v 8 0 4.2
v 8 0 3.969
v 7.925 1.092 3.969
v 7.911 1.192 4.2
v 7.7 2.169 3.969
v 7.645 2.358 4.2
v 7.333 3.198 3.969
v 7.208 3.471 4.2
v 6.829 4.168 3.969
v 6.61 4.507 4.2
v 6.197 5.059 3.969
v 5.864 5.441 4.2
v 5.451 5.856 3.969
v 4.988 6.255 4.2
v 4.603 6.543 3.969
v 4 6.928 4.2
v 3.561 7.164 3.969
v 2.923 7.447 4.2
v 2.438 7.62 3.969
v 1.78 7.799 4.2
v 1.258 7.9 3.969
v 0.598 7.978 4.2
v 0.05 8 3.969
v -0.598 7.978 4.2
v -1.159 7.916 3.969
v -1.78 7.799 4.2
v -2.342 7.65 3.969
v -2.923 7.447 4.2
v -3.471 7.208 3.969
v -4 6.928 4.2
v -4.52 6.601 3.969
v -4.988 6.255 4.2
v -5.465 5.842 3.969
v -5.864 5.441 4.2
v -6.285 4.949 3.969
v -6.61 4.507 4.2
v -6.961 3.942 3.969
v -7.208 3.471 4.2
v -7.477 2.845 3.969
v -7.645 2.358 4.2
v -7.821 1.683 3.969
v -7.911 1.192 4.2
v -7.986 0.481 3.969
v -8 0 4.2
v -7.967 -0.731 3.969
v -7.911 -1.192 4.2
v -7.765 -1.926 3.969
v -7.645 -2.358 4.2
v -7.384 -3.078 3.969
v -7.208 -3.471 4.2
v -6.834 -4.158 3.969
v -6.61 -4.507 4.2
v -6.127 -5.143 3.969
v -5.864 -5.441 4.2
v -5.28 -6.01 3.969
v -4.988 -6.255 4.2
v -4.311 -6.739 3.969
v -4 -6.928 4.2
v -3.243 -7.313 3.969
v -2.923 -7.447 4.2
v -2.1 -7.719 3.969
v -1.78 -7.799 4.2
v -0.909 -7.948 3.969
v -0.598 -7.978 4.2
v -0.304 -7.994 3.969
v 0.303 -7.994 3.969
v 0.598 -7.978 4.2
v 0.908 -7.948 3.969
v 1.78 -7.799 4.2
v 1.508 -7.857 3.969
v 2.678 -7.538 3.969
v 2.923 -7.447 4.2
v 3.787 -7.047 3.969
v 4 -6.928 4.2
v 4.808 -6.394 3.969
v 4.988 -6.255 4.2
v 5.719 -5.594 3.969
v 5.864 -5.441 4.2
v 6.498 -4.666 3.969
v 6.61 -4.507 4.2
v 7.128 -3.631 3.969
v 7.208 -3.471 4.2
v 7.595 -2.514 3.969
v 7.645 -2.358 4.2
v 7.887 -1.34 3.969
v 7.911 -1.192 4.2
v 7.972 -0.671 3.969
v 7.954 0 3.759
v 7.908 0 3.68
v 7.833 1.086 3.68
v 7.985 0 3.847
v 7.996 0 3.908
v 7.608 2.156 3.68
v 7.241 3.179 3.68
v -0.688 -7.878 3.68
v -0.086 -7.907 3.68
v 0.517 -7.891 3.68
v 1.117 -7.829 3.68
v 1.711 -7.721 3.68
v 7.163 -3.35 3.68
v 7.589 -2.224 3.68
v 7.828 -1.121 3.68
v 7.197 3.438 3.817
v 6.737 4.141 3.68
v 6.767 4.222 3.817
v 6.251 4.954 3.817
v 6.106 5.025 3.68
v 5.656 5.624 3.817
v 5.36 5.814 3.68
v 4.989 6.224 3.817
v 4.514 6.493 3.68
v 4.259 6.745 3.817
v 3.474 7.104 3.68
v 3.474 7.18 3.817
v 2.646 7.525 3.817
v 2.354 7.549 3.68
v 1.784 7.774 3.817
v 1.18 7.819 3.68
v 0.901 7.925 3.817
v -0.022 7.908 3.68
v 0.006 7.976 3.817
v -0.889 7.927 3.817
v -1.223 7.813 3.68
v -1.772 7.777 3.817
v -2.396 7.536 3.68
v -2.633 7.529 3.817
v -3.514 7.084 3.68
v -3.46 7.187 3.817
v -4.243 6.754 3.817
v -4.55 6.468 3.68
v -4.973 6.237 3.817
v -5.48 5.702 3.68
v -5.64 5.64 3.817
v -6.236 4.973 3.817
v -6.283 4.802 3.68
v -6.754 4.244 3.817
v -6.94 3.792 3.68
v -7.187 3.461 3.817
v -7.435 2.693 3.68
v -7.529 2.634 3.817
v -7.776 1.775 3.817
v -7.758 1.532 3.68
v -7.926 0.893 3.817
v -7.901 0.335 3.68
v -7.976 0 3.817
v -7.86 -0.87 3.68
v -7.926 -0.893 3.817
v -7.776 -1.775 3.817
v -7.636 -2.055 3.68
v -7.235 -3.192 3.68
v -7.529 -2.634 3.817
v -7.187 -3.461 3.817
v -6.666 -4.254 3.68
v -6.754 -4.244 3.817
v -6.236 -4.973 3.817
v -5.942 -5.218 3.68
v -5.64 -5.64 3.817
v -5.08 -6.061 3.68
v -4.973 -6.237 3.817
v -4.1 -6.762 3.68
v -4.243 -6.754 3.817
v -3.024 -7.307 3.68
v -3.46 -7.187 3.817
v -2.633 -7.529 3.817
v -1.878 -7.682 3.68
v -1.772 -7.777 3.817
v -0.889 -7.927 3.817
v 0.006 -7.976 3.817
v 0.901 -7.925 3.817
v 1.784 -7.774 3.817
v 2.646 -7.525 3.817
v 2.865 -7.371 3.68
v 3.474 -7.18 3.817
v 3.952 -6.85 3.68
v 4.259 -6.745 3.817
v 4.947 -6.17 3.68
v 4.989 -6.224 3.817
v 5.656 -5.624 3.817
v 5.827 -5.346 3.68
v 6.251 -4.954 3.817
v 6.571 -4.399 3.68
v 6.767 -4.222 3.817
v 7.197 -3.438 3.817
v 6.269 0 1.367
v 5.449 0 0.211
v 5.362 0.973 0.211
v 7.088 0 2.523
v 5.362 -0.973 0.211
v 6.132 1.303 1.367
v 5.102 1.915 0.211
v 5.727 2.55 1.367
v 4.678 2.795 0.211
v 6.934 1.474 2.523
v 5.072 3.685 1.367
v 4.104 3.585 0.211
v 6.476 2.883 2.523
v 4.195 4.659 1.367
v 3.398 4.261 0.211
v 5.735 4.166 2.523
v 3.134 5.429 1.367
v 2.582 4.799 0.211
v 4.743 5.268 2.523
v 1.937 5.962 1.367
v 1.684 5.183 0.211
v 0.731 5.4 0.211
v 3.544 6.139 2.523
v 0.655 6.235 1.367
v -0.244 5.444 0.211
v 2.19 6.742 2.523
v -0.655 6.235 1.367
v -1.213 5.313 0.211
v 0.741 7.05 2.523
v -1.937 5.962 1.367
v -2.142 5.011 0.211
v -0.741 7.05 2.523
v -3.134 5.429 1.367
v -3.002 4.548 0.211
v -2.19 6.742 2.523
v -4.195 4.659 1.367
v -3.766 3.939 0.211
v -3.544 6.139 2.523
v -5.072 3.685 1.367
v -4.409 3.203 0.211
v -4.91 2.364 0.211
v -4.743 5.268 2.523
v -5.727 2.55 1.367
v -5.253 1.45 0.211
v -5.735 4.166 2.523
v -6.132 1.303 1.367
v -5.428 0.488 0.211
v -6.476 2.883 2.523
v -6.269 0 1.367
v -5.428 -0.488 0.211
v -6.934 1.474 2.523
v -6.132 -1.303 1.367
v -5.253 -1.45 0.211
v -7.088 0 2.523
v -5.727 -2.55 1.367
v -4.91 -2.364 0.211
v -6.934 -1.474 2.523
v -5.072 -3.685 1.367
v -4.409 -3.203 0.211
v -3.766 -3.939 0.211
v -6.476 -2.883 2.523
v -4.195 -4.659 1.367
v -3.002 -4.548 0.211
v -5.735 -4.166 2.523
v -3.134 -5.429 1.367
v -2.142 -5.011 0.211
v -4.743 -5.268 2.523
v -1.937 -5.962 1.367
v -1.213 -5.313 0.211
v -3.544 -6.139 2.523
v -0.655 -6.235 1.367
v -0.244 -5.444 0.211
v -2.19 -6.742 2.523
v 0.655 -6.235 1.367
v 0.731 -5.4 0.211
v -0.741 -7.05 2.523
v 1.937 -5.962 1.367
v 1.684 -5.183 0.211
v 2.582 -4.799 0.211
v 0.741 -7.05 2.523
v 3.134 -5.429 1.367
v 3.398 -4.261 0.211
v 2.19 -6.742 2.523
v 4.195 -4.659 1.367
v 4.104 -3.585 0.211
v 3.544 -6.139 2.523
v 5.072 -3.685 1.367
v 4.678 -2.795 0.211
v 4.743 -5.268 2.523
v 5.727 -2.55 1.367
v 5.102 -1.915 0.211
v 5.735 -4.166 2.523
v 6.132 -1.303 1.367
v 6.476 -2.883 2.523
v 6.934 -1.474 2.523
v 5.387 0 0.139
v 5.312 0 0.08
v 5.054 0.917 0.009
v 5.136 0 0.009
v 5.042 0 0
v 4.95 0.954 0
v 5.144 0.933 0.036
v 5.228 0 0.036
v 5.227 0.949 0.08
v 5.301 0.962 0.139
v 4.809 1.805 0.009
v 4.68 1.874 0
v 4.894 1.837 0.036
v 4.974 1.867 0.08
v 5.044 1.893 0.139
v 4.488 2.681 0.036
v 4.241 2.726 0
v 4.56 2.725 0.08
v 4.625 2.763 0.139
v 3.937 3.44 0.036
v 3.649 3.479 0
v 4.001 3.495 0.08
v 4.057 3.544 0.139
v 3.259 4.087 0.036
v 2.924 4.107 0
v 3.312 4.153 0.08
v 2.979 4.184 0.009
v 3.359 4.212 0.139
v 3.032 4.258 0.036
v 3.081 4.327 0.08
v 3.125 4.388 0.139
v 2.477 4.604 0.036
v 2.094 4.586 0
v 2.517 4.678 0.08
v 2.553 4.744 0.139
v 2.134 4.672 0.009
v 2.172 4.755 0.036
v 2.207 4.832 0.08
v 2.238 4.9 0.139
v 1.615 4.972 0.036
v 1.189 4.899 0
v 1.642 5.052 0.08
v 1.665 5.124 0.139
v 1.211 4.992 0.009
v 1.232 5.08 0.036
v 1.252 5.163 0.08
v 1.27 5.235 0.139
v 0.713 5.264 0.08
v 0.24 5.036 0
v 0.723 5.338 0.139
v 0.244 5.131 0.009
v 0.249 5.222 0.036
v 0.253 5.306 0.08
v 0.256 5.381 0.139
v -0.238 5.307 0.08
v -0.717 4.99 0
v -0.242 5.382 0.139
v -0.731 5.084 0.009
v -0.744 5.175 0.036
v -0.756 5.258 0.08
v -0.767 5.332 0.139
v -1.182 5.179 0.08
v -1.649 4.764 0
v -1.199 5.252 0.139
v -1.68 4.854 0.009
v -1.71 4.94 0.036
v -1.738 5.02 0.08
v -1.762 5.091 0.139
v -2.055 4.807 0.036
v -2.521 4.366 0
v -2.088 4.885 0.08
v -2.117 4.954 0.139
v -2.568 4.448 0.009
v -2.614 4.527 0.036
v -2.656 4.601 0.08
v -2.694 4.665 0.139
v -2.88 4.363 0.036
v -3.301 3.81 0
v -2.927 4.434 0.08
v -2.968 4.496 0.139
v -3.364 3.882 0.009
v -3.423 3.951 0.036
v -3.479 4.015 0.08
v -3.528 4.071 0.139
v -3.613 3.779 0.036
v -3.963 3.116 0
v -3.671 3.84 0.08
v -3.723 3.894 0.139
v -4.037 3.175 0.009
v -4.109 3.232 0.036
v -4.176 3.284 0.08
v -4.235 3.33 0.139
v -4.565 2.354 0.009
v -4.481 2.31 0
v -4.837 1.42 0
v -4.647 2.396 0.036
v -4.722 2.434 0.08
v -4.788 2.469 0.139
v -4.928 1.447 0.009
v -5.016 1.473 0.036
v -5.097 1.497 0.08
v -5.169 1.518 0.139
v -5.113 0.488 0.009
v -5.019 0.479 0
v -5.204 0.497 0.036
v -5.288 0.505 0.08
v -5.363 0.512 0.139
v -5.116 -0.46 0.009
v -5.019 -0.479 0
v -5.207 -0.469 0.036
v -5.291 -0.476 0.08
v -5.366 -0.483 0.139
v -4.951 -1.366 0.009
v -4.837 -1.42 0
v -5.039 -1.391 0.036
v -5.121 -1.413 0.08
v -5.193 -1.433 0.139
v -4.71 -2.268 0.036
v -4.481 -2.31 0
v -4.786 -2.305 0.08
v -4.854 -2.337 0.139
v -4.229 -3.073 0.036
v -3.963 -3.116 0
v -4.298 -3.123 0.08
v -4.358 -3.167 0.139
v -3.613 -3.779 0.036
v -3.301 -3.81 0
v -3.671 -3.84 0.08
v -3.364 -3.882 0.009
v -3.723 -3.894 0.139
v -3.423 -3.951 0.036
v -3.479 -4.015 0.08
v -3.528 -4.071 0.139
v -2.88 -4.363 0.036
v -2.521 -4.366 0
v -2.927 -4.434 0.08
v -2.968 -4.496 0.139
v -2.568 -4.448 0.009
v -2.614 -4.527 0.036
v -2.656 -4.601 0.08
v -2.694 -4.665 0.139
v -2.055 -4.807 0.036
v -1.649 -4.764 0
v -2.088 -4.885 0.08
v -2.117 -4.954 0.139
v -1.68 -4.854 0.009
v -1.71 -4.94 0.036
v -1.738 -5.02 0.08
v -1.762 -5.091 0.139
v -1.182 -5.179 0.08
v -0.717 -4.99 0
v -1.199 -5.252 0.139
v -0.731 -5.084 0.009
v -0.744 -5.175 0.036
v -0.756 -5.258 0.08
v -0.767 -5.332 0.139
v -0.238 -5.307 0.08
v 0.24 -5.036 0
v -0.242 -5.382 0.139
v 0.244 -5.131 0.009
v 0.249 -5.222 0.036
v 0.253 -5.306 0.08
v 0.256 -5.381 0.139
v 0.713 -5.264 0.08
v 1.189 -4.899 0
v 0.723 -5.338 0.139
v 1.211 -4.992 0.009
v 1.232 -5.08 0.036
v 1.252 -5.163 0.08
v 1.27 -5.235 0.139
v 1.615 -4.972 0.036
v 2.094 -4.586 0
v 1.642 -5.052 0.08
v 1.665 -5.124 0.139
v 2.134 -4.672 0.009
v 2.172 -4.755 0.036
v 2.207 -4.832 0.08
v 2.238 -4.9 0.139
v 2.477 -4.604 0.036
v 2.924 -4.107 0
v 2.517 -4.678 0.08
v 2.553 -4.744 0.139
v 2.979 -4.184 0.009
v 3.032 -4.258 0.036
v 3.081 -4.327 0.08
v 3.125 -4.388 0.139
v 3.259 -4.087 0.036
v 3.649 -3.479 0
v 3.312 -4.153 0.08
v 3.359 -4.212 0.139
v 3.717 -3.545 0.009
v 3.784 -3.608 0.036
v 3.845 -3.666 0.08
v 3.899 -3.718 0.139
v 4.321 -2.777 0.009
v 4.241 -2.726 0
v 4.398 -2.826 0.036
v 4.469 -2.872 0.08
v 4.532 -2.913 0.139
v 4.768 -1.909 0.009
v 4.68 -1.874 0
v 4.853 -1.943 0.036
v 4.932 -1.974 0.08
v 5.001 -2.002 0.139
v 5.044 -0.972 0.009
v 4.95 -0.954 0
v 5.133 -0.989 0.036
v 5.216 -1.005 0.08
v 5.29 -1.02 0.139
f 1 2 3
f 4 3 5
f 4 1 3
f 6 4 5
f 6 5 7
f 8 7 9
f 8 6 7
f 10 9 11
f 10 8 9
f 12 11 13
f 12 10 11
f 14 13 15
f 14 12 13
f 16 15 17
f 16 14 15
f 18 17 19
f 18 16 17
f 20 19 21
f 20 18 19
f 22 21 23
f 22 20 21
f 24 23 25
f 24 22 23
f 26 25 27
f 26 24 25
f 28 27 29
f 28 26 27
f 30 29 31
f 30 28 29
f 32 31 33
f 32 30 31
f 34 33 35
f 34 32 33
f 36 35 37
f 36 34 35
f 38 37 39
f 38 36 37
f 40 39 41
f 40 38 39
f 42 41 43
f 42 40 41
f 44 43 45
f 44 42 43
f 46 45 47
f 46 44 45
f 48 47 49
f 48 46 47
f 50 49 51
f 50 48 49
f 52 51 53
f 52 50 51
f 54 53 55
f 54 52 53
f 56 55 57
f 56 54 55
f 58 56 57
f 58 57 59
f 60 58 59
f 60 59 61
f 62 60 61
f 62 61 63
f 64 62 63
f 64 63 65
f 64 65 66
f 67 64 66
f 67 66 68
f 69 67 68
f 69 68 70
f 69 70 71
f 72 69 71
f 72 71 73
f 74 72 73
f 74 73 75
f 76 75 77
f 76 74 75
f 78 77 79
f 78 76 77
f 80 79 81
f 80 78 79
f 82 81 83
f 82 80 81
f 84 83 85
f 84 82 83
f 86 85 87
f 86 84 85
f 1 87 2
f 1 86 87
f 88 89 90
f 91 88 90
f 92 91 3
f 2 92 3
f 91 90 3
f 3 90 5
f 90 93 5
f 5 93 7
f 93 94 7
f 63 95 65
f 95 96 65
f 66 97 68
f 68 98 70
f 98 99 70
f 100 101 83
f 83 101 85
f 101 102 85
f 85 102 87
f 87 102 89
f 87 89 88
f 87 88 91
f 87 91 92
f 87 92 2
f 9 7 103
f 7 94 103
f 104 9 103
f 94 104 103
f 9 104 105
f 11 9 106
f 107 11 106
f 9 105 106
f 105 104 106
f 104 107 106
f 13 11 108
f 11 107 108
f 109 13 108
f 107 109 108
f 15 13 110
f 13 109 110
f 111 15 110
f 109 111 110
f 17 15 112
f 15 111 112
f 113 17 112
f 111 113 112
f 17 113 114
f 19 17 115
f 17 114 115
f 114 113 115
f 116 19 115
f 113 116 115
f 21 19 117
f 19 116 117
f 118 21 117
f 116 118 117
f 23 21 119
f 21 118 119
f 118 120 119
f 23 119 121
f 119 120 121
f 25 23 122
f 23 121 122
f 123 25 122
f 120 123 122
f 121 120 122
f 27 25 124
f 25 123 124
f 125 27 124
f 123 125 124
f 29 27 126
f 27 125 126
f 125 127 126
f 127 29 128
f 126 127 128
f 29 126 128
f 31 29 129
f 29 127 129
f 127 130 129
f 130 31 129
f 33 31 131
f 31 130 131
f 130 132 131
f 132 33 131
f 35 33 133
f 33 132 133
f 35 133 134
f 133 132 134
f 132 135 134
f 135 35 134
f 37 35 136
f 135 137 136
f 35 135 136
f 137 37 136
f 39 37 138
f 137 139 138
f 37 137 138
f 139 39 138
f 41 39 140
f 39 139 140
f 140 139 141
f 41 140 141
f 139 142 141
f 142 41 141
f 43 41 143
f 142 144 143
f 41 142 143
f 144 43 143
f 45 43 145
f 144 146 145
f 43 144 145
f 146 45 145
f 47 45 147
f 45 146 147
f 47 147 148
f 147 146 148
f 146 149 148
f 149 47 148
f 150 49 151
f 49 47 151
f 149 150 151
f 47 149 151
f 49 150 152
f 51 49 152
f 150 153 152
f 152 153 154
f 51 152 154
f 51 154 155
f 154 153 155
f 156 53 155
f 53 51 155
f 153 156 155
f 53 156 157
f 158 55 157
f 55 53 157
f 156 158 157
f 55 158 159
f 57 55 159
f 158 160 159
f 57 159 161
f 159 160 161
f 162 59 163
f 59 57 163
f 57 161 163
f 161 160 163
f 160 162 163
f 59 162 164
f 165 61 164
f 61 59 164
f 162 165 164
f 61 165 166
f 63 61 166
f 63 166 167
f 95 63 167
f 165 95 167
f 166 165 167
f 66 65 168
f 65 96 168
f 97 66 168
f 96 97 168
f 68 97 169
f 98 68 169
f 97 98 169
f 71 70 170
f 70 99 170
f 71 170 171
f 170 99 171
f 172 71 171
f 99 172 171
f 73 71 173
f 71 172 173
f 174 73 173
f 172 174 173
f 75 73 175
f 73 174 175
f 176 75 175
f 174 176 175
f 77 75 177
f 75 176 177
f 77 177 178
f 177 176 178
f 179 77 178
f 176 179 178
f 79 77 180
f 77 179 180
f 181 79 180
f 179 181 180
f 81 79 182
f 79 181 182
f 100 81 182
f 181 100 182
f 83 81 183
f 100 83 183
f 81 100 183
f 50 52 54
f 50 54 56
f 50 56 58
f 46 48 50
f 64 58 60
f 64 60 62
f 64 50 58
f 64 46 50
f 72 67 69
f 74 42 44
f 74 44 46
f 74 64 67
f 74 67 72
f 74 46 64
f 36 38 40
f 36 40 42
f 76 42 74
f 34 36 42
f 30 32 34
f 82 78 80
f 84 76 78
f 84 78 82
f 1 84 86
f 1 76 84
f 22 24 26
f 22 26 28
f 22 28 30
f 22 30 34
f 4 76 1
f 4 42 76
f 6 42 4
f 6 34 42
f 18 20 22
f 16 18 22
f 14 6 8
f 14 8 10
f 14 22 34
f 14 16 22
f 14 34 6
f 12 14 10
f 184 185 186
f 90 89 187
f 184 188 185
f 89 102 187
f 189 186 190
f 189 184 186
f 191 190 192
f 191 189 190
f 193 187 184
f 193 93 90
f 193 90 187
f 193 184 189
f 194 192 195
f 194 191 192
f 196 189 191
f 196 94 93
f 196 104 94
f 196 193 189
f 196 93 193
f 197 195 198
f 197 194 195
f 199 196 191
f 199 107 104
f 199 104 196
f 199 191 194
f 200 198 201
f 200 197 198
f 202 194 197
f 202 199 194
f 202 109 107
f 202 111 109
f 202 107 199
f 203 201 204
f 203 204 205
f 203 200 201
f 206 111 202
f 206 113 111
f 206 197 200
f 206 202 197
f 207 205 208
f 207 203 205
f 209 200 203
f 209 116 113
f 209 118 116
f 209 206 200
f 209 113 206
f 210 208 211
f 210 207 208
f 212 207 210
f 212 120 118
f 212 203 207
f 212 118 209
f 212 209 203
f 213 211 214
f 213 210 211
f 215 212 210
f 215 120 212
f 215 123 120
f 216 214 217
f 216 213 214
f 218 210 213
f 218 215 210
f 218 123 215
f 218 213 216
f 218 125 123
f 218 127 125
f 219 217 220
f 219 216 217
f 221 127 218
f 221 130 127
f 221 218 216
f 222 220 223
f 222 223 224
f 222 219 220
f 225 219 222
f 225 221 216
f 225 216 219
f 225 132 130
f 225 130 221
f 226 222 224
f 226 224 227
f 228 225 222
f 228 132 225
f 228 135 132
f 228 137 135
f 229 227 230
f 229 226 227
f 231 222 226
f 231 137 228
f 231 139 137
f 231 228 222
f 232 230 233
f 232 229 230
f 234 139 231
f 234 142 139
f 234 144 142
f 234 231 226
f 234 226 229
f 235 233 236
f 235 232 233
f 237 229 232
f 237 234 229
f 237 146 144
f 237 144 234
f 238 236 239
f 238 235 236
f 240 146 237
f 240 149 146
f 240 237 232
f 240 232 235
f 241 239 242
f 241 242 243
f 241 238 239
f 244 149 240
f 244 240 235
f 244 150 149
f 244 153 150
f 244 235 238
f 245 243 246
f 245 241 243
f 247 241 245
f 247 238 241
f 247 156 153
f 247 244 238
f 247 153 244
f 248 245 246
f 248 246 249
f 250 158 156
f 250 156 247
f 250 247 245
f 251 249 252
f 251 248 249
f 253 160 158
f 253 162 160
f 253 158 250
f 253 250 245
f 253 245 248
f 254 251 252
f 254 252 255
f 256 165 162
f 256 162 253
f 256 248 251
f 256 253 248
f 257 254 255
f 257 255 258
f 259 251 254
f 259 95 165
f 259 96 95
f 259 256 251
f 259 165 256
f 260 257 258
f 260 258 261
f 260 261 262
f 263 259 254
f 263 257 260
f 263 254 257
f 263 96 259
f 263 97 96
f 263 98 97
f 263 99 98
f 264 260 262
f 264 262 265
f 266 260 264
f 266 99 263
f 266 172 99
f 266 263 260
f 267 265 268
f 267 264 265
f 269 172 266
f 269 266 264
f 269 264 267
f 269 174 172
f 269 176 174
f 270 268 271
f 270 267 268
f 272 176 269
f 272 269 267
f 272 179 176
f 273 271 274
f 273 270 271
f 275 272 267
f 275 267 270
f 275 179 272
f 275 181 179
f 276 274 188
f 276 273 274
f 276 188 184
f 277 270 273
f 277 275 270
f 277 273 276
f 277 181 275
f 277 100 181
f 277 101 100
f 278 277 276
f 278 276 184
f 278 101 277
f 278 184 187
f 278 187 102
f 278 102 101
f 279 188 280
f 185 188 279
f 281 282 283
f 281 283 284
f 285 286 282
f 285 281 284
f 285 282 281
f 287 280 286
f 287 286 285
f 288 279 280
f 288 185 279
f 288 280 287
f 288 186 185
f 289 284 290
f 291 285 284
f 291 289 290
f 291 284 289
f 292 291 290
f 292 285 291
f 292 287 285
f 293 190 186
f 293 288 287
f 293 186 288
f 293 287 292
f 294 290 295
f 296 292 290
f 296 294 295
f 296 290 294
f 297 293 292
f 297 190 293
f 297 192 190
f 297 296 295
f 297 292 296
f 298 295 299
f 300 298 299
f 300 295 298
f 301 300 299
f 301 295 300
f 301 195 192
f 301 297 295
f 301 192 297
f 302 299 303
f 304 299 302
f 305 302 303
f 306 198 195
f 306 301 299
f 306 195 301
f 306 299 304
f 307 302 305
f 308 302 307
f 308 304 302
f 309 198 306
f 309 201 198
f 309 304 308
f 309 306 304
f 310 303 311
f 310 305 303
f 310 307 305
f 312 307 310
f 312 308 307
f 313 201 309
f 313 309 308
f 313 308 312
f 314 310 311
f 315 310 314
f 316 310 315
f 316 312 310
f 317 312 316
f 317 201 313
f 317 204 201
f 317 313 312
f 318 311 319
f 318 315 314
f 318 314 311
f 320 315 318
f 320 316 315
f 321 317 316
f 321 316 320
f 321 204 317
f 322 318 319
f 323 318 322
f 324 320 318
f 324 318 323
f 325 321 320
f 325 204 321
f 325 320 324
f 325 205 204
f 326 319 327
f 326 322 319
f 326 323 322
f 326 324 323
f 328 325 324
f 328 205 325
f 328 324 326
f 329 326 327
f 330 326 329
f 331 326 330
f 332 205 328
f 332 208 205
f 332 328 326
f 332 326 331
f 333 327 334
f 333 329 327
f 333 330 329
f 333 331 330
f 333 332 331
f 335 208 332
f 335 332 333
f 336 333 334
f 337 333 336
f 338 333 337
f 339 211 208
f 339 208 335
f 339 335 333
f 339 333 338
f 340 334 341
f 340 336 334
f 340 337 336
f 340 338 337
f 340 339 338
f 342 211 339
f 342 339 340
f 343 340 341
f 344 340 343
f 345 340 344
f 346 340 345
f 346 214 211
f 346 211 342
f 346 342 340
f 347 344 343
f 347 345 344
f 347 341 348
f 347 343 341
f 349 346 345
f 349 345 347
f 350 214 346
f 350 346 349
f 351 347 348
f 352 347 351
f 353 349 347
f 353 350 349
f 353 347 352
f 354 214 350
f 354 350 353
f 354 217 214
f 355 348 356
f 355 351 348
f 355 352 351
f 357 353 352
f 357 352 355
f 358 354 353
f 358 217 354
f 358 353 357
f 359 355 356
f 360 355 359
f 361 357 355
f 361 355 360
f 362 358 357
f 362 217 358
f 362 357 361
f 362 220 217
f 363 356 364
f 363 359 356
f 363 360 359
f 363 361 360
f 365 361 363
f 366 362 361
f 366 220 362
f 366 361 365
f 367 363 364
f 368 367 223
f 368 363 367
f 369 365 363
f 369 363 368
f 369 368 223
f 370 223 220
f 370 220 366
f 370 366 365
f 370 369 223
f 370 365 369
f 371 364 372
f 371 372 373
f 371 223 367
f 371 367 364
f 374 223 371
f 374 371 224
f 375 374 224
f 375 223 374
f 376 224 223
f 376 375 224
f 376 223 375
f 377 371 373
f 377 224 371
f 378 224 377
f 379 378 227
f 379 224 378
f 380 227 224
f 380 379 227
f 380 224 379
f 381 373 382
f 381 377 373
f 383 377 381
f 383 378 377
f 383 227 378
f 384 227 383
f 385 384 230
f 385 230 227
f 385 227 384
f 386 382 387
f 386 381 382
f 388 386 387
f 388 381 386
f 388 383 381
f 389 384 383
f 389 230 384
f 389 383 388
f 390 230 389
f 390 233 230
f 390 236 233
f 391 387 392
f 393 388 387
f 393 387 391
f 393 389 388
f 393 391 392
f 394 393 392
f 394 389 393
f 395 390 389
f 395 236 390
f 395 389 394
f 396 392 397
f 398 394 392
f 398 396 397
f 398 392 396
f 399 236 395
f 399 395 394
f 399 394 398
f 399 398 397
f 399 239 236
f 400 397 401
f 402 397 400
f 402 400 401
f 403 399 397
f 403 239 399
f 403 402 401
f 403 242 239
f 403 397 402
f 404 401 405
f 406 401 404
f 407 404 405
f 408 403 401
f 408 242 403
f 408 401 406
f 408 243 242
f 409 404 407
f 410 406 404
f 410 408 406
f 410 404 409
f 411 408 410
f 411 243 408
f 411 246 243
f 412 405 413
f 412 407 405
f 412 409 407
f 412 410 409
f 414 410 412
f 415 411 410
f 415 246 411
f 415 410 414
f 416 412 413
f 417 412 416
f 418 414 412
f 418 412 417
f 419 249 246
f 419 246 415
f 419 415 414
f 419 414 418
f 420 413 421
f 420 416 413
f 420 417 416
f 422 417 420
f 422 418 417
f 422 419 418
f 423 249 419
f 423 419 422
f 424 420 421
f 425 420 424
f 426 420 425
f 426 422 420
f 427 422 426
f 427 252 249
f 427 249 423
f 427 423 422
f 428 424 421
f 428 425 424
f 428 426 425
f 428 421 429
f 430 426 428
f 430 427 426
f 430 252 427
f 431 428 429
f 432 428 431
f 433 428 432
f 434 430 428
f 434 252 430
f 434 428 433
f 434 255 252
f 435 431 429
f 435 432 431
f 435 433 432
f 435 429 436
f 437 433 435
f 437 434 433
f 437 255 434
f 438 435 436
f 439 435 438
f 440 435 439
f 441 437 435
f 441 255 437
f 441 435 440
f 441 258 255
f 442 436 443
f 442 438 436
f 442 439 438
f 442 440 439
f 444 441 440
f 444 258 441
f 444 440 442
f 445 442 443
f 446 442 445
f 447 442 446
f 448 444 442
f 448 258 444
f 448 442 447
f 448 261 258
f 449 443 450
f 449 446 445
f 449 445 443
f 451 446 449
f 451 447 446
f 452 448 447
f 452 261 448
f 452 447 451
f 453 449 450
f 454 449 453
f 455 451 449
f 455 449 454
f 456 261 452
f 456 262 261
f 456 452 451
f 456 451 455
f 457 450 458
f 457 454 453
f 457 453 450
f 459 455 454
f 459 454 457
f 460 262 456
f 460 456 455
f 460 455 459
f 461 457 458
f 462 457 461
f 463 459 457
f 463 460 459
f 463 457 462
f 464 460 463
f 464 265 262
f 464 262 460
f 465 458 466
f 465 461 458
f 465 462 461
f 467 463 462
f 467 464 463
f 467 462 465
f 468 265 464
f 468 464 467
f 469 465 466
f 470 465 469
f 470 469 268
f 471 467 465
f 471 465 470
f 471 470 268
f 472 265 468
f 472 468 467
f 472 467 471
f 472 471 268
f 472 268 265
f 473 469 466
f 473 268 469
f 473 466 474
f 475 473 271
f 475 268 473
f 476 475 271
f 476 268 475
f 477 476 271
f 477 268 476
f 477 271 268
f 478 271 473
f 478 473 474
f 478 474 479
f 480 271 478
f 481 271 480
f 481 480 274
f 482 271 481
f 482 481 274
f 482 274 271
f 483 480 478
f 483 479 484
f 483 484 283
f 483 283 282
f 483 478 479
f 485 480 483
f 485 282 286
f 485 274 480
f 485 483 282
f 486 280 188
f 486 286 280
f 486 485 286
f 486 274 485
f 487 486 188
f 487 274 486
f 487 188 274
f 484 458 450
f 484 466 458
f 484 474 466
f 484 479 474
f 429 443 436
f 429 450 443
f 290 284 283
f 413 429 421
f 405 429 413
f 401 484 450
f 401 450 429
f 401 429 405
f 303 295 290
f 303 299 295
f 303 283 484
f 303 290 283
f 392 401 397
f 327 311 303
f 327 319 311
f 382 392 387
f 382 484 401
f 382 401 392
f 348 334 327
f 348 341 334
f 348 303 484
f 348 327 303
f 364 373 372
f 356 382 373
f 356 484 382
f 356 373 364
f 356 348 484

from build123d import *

# Parameters (mm, degrees)
F2_R = 0.5
F3_R = 0.5


with BuildPart() as f1:
    # F0 (on Front) → F1 (revolve)
    with BuildSketch(Plane.XZ):
        Polygon((8, 4.2), (0, 4.2), (0, 0), (5.3, 0), (8, 3.809567), align=None)
    revolve(axis=Axis((0, 0, 2.1), (0, 0, 1)))

    # F2
    f2_edges = [f1.edges().sort_by_distance(p)[0] for p in [
        (-5.3, 0, 0),
    ]]
    fillet(f2_edges, radius=F2_R)

    # F3
    f3_edges = [f1.edges().sort_by_distance(p)[0] for p in [
        (-8, 0, 3.809567),
    ]]
    fillet(f3_edges, radius=F3_R)


solid = f1.part
